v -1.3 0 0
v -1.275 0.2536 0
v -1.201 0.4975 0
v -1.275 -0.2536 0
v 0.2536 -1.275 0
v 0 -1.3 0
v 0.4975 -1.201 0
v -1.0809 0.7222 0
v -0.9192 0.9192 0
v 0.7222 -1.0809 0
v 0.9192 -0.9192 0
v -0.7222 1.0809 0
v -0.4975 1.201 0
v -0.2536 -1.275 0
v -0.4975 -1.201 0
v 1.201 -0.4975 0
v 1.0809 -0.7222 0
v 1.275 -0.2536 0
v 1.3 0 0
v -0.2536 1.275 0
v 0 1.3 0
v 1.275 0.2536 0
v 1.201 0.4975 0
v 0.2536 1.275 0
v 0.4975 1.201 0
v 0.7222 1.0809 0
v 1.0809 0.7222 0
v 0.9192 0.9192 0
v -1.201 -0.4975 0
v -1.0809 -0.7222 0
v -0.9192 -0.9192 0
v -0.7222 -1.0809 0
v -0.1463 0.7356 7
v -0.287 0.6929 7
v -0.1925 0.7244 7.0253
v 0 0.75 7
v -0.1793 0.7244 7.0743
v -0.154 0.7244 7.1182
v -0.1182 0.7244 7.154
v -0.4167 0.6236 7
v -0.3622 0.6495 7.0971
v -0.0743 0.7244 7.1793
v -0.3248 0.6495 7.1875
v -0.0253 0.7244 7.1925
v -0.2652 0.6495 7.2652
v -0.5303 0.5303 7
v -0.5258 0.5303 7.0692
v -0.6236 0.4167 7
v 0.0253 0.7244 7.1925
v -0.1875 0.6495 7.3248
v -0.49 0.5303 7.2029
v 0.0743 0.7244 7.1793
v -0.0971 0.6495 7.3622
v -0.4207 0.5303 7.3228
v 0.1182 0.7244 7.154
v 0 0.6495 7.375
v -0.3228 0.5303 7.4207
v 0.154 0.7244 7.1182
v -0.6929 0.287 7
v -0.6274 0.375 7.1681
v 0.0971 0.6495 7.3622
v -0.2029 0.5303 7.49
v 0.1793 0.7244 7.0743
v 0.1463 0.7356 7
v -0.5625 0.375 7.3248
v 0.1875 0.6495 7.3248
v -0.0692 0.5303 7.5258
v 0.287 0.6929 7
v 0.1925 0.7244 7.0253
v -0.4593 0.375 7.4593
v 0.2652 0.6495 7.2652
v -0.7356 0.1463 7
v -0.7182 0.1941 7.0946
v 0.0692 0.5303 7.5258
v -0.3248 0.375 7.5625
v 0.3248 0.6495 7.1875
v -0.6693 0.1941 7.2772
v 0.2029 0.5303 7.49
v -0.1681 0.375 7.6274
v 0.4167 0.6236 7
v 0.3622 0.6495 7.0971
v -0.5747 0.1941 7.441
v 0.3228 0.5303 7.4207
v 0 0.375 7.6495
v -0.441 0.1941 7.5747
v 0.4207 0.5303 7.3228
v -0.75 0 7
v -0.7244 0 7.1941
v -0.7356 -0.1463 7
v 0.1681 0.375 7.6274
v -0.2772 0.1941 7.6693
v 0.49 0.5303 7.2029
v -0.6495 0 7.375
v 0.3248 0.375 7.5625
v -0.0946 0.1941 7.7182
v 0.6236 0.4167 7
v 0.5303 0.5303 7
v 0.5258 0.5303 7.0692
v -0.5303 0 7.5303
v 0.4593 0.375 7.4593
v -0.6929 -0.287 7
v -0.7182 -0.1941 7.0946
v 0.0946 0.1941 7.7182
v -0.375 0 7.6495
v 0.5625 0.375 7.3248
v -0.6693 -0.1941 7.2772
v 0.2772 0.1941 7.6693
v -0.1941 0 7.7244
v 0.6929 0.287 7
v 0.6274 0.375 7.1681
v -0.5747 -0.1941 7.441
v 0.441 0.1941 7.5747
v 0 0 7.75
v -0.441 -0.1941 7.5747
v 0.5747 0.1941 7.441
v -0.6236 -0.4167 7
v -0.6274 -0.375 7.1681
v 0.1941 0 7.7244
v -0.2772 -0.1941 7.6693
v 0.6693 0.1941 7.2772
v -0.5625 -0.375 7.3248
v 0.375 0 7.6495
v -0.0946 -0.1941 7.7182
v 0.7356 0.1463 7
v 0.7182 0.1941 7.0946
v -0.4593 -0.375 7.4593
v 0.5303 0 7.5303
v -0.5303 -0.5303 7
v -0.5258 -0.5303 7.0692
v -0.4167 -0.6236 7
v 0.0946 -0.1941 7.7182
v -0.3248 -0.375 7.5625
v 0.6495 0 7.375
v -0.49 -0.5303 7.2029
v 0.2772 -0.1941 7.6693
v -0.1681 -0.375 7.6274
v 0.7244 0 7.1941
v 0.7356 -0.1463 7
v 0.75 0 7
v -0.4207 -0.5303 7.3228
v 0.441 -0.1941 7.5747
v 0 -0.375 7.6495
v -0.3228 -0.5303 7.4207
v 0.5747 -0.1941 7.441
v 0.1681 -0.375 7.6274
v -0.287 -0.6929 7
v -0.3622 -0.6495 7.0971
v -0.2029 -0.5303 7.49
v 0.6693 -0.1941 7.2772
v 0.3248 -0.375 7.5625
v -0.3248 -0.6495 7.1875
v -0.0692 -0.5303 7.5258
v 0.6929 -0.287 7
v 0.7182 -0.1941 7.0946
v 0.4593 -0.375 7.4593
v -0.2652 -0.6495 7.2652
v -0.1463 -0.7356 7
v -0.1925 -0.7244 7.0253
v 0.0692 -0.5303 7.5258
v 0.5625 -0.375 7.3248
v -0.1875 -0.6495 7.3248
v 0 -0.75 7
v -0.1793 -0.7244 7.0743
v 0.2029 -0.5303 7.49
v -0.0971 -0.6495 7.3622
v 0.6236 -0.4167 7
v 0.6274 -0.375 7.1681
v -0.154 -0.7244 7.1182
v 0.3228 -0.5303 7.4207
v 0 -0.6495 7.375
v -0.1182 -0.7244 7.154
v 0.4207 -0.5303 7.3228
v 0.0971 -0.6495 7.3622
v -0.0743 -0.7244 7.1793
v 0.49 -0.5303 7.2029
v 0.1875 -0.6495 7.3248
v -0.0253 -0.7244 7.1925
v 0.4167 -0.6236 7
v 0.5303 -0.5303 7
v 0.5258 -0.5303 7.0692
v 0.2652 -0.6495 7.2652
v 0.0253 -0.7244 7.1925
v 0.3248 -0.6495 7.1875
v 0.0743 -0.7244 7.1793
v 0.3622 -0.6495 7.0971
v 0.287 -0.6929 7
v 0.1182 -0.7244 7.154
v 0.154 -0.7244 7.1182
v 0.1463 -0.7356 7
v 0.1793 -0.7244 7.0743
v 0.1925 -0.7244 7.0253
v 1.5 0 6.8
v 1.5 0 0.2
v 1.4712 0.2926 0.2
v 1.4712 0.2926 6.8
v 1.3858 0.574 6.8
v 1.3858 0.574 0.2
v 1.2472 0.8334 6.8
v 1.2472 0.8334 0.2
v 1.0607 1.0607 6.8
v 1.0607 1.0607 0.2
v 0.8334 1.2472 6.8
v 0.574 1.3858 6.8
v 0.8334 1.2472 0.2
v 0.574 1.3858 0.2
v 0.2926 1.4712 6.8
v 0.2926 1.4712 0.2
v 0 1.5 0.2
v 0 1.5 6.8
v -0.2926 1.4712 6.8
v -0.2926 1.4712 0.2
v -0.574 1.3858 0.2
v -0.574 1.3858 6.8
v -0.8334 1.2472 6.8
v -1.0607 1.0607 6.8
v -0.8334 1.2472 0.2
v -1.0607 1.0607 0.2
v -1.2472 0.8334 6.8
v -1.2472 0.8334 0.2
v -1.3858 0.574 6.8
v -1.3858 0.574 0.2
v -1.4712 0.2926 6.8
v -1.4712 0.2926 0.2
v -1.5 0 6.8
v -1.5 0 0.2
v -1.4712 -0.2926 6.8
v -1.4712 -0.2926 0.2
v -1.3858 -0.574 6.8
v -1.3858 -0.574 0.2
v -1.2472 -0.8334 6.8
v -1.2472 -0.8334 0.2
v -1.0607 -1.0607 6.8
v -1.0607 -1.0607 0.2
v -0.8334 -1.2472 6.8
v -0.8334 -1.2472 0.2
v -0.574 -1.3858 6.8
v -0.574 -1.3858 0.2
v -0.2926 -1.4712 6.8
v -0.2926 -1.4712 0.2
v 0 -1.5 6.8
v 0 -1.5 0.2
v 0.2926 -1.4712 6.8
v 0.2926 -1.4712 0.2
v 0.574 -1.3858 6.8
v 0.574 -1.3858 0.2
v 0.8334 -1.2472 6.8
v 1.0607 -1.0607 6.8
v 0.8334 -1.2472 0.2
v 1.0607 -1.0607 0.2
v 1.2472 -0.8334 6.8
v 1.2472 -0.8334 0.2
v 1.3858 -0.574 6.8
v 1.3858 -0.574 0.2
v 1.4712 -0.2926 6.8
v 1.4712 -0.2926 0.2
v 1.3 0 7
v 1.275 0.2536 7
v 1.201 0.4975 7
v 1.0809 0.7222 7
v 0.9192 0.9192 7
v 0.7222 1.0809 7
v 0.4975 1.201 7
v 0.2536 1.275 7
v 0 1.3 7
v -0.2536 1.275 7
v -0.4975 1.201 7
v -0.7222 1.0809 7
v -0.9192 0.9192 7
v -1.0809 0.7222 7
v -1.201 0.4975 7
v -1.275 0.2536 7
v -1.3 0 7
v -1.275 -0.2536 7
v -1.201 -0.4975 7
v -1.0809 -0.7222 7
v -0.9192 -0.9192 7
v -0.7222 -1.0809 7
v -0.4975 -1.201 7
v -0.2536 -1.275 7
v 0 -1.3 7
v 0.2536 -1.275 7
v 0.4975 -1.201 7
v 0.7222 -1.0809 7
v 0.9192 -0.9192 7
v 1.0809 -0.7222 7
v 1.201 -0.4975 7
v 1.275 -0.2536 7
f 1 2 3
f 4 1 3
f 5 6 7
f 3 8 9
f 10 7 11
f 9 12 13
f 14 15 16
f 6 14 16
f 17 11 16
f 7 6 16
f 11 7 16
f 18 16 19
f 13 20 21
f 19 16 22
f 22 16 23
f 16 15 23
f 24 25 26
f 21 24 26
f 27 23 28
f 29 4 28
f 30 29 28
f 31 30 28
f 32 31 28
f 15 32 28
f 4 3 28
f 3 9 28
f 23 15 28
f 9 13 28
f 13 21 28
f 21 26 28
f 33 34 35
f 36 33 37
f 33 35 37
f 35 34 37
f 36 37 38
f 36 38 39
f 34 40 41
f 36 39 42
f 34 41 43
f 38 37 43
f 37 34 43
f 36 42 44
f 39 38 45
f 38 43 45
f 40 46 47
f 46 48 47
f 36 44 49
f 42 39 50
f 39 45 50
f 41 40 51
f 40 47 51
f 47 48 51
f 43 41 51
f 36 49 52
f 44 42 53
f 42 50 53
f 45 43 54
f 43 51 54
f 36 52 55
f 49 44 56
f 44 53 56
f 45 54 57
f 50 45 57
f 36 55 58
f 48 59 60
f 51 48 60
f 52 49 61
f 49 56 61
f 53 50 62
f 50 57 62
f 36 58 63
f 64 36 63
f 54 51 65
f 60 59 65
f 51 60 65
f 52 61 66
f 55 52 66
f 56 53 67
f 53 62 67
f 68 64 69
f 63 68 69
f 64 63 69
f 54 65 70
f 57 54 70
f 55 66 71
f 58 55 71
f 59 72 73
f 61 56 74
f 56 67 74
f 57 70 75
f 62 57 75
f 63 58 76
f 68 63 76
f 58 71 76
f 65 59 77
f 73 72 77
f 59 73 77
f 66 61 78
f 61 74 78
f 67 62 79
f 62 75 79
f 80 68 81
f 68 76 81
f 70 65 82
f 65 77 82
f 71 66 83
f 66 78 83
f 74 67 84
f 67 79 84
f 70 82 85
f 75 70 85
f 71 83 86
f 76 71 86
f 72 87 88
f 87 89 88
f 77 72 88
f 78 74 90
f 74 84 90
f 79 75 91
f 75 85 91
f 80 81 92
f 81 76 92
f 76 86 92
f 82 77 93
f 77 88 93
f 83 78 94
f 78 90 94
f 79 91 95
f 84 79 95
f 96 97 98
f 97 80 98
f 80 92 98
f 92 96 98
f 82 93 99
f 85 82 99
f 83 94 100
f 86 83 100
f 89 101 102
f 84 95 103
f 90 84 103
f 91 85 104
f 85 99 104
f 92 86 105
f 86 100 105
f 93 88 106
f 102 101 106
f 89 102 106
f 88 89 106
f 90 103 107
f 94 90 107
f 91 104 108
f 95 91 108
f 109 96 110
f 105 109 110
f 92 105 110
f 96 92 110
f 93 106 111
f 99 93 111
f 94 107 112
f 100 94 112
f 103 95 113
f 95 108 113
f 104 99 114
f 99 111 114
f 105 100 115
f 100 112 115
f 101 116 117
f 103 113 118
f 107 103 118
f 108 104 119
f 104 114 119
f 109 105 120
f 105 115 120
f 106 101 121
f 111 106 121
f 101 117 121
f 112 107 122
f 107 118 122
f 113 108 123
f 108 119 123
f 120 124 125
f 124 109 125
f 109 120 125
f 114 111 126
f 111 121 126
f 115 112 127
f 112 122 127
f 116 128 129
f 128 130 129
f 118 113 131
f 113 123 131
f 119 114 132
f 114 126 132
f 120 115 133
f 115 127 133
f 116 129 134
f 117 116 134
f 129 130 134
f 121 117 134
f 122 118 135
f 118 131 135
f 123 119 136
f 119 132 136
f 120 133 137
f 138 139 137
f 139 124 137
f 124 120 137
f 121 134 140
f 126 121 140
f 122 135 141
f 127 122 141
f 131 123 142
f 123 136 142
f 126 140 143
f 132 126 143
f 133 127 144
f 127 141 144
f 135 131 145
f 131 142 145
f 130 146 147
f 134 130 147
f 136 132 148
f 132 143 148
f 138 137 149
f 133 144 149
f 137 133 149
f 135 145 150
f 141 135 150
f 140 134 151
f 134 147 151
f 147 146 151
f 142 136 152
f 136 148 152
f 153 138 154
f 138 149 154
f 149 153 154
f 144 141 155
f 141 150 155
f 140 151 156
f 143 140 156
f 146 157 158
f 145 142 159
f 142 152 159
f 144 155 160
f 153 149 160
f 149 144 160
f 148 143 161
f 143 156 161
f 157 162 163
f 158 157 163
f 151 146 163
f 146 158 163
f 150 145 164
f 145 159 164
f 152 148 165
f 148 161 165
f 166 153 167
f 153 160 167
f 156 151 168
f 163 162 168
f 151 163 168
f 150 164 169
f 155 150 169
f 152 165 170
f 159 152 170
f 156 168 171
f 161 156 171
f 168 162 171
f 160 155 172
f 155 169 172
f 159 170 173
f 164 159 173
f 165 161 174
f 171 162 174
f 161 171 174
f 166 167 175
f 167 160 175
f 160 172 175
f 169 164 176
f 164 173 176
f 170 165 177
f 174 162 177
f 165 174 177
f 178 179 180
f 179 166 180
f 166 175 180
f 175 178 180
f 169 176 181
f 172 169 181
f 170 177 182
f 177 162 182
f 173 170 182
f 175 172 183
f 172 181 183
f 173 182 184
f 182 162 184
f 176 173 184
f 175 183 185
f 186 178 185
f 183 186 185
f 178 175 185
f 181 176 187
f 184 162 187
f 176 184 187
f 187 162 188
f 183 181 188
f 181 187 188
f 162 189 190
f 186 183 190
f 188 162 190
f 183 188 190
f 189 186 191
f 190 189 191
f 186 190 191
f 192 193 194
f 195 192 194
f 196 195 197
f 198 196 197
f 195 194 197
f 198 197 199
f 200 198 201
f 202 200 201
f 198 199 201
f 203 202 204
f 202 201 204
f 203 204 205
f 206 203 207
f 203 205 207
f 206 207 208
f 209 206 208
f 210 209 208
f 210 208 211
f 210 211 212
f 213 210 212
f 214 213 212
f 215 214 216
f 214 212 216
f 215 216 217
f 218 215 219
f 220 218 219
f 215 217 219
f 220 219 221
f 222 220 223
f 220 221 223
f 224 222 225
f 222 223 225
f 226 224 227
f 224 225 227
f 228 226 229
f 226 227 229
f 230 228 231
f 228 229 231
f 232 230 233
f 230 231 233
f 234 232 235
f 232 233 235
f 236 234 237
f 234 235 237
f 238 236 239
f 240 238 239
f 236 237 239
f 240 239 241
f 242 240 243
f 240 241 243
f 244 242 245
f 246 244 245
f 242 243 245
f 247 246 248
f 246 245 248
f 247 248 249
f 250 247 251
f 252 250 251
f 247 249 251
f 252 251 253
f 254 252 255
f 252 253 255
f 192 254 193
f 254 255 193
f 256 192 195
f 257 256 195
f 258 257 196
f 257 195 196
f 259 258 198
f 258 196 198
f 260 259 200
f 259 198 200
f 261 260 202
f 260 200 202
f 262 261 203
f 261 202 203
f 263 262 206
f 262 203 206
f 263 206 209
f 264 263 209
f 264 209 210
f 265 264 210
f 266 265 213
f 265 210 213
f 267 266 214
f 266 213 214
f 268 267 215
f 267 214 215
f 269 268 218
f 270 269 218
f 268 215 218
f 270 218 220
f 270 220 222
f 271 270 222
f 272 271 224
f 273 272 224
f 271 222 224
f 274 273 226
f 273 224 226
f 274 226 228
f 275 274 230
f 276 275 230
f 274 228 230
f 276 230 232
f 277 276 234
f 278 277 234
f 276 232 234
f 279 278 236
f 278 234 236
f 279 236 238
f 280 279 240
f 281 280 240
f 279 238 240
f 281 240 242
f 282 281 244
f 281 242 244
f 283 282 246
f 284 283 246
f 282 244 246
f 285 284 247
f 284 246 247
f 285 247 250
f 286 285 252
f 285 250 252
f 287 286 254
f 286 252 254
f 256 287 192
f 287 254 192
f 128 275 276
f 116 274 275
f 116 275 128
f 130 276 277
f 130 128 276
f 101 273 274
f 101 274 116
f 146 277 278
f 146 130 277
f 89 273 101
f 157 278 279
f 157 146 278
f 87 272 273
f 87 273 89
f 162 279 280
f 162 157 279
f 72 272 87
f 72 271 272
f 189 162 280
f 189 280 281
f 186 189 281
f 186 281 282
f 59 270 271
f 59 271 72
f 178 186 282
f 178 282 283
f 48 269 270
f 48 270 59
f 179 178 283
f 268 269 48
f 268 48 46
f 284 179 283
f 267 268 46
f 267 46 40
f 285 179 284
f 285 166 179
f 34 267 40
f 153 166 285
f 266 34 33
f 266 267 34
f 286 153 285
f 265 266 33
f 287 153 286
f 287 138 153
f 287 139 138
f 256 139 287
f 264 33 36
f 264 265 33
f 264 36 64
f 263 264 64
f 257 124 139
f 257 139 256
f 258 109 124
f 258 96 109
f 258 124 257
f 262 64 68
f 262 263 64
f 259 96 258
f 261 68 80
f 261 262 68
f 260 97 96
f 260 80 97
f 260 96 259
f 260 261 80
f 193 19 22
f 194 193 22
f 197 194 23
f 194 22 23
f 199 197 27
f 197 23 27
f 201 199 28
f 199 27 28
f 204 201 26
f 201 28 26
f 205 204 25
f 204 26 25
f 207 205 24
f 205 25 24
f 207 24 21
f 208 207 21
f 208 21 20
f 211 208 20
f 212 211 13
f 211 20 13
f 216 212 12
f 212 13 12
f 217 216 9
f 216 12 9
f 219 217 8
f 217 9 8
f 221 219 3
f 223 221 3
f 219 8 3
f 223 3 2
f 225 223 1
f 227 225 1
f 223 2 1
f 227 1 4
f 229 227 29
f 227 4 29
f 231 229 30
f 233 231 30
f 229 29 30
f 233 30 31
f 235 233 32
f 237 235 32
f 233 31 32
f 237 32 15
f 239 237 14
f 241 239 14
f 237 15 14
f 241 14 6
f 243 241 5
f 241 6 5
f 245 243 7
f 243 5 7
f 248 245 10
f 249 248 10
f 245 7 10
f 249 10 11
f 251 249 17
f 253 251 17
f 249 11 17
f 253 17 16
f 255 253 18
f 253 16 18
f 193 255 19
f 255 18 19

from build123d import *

# Parameters (mm, degrees)
F0_R     = 1.5
F1_DEPTH = 7
F5_SIZE  = 0.2


with BuildPart() as f1:
    # F0 (on Top) → F1 (new body)
    with BuildSketch(Plane.XY):
        Circle(F0_R)
    extrude(amount=F1_DEPTH)

    # F3 (on face) → F4 (revolve)
    with BuildSketch(Plane.XY.offset(7)):
        with BuildLine():
            Line((0, -0.75), (0, 0.75))
            ThreePointArc((0, 0.75), (-0.75, 0), (0, -0.75))
        make_face()
    revolve(axis=Axis((0, 0, 7), (0, 1, 0)))

    # F5
    f5_edges = [f1.edges().sort_by_distance(p)[0] for p in [
        (-1.5, 0, 7),
        (-1.5, 0, 0),
    ]]
    chamfer(f5_edges, length=F5_SIZE)


solid = f1.part
